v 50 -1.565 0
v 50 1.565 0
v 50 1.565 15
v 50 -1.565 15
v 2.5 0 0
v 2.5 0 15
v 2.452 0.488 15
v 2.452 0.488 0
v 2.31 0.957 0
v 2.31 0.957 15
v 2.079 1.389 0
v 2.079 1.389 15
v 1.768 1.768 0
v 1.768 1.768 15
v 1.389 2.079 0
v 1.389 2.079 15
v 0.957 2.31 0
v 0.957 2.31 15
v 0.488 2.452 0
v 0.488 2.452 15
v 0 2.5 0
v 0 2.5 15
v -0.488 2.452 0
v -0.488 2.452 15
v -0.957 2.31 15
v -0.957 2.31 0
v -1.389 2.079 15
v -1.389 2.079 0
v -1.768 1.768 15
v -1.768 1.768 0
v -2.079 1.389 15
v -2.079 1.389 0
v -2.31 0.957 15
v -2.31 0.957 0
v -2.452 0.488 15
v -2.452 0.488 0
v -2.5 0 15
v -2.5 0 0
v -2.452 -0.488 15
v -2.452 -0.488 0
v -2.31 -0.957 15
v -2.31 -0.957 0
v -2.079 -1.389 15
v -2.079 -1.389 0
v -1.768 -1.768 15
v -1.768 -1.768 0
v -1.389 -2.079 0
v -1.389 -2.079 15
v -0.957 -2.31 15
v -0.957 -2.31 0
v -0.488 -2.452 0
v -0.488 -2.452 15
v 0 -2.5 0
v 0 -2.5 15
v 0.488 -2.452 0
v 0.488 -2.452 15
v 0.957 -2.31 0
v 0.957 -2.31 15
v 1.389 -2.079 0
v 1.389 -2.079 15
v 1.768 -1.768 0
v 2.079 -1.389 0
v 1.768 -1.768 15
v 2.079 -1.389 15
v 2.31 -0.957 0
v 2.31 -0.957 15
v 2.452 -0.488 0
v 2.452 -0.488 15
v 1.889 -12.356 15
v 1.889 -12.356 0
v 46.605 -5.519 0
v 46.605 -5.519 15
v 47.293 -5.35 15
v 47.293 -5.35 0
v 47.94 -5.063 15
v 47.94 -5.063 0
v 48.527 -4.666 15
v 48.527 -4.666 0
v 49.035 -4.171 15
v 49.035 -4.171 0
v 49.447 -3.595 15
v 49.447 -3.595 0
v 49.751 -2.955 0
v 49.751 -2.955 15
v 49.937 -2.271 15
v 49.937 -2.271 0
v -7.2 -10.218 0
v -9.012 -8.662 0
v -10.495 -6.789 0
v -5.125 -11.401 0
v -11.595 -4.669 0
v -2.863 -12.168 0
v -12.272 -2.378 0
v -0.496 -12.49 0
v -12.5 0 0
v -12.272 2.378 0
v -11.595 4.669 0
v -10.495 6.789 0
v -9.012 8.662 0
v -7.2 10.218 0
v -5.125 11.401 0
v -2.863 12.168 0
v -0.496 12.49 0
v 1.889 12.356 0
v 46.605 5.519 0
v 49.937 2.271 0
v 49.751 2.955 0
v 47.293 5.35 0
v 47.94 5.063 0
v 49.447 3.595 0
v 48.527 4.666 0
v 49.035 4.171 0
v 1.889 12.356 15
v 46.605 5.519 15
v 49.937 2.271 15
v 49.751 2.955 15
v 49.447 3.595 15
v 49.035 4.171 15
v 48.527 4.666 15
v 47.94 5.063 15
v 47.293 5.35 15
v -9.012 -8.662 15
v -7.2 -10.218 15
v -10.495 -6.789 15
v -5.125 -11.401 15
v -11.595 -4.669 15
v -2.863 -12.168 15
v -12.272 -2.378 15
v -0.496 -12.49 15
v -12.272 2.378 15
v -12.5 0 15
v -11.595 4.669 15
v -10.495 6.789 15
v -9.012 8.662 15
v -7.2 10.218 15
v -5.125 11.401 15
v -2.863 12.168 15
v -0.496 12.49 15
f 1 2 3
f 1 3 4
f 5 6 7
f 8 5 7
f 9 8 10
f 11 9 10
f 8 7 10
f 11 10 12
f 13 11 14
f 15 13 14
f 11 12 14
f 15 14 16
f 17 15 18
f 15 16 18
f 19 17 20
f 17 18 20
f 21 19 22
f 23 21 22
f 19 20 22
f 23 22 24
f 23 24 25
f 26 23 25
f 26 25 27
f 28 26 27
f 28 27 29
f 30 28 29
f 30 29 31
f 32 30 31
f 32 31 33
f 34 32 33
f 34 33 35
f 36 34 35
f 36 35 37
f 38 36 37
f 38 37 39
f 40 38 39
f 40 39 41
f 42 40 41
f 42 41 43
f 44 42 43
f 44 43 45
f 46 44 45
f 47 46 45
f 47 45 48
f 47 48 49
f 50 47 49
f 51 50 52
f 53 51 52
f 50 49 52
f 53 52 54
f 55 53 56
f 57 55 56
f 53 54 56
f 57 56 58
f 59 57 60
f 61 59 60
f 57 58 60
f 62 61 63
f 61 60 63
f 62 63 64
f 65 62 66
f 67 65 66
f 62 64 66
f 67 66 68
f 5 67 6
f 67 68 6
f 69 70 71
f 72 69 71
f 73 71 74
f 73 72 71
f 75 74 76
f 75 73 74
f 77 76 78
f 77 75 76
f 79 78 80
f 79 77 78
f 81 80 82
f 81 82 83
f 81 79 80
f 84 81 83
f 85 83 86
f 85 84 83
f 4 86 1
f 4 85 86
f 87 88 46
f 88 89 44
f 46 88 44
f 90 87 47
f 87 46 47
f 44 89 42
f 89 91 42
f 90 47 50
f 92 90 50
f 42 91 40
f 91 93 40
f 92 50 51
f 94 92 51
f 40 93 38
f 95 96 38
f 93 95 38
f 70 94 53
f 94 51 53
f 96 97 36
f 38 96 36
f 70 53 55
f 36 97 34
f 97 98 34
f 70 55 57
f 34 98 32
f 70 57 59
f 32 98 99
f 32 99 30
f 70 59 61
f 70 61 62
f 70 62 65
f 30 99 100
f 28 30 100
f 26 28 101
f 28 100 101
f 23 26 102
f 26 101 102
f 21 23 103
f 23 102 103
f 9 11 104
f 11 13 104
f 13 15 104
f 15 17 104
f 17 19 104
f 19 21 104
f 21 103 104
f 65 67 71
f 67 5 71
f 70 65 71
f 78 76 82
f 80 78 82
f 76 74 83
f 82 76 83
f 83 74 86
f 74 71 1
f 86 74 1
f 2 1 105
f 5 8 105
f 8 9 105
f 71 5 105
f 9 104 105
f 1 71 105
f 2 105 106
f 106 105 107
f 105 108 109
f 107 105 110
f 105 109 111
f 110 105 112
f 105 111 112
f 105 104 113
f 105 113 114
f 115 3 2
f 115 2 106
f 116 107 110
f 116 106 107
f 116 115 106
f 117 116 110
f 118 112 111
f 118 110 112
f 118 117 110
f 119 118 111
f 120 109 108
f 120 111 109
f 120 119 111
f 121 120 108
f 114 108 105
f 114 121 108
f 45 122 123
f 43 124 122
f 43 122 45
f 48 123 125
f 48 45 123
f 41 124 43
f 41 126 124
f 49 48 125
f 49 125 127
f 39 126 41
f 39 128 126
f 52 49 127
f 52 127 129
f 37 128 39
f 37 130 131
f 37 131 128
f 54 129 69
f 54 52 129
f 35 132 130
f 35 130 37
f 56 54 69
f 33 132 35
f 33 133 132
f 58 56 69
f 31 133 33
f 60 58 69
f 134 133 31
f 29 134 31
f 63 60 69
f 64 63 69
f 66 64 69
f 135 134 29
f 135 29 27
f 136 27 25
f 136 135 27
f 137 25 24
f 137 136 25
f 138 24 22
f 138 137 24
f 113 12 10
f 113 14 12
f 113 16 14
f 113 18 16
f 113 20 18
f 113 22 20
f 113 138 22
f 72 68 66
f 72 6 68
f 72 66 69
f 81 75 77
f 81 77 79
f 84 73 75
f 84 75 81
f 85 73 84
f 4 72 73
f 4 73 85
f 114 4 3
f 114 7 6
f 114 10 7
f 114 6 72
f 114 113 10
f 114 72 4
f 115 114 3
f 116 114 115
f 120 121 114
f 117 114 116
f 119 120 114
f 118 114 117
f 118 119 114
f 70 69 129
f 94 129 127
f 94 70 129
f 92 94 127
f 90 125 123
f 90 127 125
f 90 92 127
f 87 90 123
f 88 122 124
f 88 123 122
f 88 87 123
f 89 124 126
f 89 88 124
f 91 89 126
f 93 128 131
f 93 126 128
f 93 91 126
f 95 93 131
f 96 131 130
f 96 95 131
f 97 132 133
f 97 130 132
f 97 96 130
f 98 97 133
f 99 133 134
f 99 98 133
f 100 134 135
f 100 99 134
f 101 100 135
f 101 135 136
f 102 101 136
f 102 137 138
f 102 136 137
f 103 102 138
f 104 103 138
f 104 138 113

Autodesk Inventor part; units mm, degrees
ref_plane "YZ Plane" through (0, 0, 0) normal (1, 0, 0) x (0, 1, 0)
ref_plane "XZ Plane" through (0, 0, 0) normal (0, 1, 0) x (-1, 0, 0)
ref_plane "XY Plane" through (0, 0, 0) normal (0, 0, 1) x (1, 0, 0)
sketch "Sketch1" plane through (0, 0, 0) normal (0, 0, 1) x (1, 0, 0)
  circle A0 centre (0, 0) radius 12.5
  line L0 (0, 0) -> (50, 0) construction
  line L1 (1.8894, 12.3564) -> (50, 5)
  line L2 (1.8894, -12.3564) -> (50, -5)
  line L3 (50, 5) -> (50, -5)
  dimension "d0" = 25
  dimension "d1" = 50
  dimension "d2" = 5
  dimension "d3" = 5
  dimension "d4" = 50
extrude "Extrusion1" add sketch "Sketch1" along normal blind 15
fillet "Fillet1" radius 4 2 edges at (50, 5, 7.5) (50, -5, 7.5)
sketch "Sketch2" plane through (0, 0, 15) normal (0, 0, 1) x (1, 0, 0)
  circle A0 centre (0, 0) radius 2.5
  dimension "d8" = 5
extrude "Extrusion2" cut sketch "Sketch2" against normal through all
equation "\"d4\" = d1"
properties part number "o_Plattenstopper" material "Birch"
